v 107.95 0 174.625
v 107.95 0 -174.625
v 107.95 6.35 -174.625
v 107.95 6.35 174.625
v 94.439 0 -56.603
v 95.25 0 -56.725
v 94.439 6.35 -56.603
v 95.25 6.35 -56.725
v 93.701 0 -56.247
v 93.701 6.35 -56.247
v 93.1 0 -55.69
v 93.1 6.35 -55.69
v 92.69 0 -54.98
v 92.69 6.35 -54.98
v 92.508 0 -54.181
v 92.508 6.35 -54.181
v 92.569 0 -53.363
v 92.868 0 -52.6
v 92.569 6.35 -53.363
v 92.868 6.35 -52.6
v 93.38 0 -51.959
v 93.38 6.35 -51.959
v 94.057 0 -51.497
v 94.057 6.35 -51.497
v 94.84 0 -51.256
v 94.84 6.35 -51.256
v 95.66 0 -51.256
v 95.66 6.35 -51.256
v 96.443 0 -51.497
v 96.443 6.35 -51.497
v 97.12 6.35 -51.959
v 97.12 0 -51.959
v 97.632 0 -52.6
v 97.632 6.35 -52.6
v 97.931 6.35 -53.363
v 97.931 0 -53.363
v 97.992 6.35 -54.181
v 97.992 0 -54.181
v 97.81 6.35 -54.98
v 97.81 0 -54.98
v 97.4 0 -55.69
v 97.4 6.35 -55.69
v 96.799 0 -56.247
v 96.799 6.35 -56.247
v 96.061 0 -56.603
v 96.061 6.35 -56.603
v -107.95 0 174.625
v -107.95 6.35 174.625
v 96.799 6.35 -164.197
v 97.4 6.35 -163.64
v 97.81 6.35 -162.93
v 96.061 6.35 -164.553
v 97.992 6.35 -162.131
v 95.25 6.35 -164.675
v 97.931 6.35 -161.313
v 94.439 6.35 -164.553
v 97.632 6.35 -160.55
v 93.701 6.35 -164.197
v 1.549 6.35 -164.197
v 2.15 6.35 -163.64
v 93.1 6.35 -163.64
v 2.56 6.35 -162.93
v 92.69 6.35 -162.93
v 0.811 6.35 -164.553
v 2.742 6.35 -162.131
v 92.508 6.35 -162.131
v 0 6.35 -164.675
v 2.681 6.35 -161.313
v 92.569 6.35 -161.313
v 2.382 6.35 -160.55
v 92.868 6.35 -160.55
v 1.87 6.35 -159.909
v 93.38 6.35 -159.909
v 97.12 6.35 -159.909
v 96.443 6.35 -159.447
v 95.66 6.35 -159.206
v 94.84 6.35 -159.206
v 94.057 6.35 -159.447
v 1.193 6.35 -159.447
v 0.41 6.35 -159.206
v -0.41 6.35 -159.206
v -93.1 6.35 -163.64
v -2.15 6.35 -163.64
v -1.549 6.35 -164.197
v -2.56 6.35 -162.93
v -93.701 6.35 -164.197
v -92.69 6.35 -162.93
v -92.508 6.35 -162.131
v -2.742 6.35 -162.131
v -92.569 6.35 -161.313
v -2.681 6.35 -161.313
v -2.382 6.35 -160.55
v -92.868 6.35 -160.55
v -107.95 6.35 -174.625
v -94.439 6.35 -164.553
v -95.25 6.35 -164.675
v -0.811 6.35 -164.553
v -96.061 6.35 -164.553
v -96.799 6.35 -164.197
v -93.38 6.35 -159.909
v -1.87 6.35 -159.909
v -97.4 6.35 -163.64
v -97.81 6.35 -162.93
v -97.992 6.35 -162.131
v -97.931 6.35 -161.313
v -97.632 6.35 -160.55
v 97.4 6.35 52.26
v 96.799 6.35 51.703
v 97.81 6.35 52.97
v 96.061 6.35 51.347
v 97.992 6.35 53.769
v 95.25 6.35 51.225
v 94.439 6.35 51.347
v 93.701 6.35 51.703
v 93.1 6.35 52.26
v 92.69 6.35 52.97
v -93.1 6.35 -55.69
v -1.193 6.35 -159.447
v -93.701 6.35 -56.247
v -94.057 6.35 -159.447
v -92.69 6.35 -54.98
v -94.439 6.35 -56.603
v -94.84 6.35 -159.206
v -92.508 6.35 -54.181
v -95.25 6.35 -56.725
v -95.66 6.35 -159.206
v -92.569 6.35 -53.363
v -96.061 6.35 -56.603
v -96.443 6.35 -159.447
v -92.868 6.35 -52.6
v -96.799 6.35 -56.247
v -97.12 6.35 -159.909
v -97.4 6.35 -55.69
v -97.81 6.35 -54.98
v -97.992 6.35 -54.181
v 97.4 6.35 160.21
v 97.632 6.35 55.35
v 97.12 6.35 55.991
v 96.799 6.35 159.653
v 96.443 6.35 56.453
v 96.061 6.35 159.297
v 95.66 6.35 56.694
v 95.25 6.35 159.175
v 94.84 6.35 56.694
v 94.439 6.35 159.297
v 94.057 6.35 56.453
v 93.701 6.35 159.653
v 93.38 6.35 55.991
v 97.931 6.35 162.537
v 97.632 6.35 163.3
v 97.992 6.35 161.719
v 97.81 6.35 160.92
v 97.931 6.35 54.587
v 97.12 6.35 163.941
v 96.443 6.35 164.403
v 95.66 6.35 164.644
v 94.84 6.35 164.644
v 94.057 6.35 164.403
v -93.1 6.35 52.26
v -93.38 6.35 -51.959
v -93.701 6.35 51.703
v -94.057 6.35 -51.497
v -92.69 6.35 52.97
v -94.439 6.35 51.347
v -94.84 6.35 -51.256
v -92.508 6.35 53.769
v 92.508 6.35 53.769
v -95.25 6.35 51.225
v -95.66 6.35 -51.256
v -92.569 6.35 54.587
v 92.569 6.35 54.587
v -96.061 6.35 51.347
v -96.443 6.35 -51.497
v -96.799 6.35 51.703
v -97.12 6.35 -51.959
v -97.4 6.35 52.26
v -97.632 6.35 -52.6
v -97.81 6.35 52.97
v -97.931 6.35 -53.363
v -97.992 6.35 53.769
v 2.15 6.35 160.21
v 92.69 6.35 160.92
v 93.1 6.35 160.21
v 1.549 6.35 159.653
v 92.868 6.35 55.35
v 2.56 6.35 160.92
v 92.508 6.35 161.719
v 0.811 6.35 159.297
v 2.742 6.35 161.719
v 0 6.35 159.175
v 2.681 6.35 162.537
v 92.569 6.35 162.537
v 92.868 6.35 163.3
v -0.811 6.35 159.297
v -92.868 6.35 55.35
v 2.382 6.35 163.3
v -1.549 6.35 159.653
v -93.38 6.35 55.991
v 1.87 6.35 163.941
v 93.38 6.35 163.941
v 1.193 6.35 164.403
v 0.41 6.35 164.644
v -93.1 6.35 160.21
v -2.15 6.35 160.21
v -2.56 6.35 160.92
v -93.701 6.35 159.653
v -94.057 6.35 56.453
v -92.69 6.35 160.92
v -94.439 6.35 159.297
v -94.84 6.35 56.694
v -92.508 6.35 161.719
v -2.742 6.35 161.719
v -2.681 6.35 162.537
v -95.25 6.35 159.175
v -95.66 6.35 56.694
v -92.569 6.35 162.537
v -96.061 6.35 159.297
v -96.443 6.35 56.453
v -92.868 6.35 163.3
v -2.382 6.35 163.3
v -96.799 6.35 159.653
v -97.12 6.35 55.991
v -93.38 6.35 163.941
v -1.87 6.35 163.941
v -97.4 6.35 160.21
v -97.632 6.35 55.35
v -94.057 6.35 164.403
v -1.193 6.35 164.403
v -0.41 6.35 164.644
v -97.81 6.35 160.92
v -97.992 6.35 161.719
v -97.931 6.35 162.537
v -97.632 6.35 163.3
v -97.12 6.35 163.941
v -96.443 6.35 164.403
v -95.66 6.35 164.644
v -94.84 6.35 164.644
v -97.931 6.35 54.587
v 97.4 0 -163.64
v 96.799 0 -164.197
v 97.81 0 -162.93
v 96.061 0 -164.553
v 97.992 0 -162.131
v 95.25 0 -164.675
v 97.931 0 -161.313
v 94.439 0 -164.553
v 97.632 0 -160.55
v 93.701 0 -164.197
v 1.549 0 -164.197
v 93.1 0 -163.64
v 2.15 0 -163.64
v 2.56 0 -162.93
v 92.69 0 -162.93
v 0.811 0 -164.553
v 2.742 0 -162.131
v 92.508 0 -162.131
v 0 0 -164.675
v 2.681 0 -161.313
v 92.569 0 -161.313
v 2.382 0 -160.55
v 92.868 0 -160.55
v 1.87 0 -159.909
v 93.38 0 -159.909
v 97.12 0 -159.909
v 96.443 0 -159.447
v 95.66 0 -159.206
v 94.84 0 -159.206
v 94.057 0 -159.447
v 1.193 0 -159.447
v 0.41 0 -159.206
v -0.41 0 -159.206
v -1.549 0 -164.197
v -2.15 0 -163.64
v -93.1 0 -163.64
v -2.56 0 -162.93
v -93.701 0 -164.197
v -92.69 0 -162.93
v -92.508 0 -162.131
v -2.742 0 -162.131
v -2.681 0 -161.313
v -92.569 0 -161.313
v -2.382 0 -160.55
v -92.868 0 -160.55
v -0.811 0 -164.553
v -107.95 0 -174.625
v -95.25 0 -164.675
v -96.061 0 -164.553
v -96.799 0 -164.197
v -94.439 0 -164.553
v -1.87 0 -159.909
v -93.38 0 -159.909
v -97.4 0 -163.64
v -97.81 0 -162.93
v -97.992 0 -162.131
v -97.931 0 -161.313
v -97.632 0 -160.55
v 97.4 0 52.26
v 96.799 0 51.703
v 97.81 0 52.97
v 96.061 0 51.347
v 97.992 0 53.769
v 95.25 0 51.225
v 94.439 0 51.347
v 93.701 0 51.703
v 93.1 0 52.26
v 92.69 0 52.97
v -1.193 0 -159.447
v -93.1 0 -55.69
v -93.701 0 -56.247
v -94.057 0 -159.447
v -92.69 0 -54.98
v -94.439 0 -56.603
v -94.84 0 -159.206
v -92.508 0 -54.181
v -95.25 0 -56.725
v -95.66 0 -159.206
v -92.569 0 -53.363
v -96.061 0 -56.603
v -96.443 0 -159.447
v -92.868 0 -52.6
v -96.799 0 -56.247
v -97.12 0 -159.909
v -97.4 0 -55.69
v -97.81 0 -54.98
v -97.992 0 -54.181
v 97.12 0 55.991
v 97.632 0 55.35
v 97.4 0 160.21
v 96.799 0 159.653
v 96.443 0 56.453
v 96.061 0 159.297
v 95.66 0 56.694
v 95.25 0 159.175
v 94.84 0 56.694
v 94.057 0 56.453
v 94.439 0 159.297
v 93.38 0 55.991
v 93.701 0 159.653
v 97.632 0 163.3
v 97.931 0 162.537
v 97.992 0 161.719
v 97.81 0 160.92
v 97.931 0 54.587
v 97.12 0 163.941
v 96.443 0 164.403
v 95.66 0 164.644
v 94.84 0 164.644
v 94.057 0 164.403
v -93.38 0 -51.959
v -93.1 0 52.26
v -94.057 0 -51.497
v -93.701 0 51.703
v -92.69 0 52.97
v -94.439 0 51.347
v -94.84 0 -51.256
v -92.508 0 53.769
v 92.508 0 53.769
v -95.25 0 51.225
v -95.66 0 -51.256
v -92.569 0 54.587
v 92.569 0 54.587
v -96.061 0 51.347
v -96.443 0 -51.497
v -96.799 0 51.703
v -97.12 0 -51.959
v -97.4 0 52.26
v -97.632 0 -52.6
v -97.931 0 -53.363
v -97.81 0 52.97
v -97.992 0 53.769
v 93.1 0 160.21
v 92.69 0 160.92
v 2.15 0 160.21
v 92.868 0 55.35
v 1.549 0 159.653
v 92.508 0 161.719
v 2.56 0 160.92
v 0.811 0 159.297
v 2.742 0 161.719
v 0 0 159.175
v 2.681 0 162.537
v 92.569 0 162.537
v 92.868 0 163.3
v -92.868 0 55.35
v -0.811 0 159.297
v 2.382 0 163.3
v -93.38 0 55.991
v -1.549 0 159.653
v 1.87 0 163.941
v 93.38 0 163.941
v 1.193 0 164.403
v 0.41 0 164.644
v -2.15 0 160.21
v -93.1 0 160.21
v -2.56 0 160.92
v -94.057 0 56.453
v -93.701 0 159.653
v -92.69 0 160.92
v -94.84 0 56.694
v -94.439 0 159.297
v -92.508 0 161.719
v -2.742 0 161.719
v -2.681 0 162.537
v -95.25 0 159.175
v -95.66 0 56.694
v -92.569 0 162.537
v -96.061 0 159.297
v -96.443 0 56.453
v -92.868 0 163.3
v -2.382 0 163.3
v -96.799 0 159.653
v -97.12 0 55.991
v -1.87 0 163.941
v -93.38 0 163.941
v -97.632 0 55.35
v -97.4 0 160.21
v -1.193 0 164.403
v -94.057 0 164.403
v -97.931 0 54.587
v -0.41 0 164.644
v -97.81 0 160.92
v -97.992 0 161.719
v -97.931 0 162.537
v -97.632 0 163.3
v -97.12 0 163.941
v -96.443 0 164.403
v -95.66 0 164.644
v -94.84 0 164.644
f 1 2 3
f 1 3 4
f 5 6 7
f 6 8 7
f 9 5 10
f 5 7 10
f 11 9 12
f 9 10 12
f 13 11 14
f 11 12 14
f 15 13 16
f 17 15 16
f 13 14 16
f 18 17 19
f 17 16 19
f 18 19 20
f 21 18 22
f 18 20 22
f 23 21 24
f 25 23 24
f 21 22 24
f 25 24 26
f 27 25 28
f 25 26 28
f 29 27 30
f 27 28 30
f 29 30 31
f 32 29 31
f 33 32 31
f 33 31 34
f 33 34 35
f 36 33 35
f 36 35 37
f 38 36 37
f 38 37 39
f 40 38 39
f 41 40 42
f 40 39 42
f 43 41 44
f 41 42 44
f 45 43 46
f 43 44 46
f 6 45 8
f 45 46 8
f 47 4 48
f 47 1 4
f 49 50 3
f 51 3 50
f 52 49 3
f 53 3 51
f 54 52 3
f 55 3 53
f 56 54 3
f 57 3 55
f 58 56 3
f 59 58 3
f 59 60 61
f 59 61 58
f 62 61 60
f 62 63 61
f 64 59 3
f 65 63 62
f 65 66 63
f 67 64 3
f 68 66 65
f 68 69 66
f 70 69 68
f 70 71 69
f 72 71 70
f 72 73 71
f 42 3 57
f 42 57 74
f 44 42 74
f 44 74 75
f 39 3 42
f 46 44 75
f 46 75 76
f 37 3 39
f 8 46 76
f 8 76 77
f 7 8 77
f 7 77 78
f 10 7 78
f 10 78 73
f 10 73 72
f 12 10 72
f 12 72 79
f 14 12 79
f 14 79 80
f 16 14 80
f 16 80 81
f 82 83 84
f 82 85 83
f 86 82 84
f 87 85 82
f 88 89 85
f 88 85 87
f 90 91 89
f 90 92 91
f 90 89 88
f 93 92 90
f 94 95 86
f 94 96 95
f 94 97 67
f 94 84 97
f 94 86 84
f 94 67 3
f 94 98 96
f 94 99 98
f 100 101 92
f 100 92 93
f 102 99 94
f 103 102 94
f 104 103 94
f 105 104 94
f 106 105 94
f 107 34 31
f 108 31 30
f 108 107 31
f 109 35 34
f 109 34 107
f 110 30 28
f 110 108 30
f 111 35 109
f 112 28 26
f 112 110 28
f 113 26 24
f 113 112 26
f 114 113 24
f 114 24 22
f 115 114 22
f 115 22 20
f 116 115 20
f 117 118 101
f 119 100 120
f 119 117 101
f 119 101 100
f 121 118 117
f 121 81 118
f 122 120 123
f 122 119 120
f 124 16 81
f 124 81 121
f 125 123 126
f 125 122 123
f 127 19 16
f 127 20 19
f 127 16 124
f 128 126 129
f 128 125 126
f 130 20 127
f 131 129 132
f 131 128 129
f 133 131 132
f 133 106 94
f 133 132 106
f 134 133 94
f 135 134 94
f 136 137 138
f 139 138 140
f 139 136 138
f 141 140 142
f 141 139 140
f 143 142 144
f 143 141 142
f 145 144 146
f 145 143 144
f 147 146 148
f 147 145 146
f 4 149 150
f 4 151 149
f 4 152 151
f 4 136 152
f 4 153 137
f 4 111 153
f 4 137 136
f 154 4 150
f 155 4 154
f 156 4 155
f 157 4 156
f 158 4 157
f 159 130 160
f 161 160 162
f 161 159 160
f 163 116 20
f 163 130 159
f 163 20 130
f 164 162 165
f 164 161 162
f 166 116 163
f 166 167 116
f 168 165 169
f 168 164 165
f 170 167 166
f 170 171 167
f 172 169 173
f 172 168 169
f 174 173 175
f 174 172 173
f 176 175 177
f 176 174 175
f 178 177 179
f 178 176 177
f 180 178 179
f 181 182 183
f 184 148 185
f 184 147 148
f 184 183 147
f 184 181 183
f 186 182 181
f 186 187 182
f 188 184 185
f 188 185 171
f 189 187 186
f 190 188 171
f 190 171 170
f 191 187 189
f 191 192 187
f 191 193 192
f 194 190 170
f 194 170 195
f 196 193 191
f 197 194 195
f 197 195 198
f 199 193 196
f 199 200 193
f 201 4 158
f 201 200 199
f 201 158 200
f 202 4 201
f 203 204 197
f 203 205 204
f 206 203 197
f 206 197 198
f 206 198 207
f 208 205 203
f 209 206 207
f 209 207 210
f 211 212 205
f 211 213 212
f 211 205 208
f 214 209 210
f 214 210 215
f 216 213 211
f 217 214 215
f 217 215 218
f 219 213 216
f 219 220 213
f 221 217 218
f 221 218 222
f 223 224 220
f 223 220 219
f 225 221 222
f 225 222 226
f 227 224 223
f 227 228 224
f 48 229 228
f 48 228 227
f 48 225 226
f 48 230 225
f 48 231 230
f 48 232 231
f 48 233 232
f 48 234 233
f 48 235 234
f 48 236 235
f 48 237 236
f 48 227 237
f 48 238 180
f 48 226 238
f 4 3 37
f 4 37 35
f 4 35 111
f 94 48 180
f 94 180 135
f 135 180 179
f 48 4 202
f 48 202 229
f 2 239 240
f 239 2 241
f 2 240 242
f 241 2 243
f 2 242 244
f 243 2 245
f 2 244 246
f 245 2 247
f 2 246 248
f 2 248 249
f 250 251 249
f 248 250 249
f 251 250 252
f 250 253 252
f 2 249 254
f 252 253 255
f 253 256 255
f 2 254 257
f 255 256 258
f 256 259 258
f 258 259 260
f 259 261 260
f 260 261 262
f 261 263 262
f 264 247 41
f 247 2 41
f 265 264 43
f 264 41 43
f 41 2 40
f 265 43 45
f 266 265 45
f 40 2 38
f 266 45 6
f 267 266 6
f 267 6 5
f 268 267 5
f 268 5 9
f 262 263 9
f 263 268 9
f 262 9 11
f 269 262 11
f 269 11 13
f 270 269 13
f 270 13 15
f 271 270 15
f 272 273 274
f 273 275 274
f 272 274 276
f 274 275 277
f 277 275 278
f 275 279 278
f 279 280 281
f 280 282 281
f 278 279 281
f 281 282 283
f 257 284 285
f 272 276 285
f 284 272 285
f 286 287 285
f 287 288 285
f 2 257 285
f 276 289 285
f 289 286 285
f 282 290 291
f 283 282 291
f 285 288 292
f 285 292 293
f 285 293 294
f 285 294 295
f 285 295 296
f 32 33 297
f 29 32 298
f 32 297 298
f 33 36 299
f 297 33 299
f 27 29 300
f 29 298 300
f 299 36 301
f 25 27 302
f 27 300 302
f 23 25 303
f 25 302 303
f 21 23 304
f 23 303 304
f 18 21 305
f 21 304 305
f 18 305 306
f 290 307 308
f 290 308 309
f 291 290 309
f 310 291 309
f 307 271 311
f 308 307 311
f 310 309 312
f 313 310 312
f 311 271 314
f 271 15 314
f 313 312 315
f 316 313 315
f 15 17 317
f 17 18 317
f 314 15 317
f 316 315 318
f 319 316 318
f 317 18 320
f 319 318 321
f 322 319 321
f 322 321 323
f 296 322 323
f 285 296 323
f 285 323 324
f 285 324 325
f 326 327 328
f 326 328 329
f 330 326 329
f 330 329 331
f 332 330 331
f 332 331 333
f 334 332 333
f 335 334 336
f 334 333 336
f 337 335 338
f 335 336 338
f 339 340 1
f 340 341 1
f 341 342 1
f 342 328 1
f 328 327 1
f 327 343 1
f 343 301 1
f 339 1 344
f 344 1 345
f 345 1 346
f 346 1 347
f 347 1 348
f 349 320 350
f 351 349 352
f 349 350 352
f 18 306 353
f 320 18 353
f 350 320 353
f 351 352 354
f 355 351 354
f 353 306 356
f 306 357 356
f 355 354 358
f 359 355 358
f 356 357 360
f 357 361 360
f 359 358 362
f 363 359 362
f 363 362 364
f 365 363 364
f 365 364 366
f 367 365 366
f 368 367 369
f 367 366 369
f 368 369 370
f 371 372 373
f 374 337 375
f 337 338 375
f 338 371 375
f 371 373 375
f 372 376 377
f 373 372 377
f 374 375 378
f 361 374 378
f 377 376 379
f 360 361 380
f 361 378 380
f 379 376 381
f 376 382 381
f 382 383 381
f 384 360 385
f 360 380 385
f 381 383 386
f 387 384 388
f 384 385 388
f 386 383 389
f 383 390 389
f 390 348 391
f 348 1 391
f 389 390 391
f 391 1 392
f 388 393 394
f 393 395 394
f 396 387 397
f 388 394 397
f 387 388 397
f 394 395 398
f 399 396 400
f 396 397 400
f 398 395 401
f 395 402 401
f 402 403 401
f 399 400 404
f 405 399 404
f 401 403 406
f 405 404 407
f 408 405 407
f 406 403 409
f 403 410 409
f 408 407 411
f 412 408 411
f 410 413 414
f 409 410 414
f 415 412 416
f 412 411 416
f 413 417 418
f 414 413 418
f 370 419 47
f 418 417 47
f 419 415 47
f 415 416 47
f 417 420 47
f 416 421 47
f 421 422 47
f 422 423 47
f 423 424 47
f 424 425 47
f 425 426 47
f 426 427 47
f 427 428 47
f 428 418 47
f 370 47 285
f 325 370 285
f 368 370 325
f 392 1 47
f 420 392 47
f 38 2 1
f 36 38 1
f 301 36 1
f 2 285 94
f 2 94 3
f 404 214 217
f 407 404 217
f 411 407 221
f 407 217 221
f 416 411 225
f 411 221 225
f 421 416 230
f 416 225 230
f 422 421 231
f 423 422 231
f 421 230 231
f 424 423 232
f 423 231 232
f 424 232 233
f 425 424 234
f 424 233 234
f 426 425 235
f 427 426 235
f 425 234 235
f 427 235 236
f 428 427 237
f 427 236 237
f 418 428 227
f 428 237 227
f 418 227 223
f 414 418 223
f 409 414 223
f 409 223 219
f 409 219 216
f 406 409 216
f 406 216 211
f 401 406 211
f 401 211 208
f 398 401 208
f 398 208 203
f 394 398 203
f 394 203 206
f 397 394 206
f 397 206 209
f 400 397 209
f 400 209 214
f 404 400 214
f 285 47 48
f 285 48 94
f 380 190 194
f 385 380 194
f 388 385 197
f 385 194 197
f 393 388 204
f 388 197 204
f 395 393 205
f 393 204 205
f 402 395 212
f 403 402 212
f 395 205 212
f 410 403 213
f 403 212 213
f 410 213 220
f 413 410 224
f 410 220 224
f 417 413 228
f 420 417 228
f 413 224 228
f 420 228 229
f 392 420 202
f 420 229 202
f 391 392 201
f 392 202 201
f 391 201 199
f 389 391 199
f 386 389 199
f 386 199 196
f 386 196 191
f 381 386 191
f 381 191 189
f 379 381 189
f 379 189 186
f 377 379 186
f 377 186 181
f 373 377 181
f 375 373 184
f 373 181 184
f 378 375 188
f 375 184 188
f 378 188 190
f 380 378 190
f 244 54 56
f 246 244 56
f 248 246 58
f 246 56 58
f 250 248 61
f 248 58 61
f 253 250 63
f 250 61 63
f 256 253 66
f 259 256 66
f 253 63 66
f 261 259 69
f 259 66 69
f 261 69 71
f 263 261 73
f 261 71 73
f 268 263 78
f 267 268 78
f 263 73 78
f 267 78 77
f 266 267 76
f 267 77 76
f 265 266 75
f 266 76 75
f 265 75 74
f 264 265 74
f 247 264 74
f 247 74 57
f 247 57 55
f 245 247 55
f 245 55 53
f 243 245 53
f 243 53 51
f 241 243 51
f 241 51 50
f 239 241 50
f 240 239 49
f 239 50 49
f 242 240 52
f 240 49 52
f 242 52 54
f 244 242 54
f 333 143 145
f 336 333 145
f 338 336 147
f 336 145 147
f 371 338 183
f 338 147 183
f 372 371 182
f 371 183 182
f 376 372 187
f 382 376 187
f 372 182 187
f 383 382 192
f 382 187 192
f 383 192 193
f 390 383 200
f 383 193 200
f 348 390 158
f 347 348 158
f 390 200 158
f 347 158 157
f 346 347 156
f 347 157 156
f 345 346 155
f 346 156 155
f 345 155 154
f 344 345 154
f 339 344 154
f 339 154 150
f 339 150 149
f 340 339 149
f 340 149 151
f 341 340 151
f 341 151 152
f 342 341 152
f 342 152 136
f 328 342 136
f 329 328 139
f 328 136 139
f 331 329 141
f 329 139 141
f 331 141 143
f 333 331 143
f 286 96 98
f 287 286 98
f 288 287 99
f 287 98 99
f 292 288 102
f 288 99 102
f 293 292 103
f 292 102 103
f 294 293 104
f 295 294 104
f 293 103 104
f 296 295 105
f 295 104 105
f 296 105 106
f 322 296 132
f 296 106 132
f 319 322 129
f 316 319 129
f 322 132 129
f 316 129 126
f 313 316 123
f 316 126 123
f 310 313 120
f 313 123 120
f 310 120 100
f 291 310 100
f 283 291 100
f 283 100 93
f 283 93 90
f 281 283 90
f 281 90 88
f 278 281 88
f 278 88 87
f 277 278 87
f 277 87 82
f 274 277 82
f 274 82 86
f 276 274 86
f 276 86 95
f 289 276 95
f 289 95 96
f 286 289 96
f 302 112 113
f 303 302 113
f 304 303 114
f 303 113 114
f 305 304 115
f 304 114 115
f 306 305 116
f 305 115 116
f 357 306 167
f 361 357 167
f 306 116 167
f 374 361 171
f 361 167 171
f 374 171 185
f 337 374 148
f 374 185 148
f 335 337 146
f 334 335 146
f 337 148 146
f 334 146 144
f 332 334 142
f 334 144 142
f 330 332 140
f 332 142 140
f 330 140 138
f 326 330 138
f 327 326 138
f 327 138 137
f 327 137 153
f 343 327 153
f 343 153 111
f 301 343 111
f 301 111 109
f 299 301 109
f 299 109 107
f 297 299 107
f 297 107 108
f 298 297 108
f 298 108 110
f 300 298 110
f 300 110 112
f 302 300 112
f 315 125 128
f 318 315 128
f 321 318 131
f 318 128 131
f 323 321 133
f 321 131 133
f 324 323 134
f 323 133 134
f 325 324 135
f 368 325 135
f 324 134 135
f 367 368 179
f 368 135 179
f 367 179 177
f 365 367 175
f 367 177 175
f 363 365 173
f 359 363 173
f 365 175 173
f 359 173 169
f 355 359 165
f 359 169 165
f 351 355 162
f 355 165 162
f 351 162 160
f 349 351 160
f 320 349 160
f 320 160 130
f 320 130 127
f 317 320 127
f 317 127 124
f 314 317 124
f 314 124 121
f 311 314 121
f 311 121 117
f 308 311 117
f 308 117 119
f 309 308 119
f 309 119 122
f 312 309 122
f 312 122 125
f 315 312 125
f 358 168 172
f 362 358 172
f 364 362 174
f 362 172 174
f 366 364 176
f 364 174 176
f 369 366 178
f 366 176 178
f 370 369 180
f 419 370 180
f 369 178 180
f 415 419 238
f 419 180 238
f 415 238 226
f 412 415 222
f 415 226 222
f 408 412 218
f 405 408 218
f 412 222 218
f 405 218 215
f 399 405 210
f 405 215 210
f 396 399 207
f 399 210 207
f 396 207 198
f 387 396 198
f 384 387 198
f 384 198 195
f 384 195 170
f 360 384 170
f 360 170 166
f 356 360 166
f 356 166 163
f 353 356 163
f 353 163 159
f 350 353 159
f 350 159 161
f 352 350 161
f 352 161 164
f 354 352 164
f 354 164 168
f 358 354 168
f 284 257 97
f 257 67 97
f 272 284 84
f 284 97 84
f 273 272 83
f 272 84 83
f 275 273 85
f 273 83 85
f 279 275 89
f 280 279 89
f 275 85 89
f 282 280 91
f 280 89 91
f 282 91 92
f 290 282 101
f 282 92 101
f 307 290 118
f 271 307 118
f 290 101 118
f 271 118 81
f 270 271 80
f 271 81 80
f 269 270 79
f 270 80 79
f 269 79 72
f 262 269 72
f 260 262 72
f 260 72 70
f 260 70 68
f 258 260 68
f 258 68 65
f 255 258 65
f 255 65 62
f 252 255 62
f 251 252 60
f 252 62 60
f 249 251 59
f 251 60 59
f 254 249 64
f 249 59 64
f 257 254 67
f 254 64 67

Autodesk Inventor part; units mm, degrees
ref_plane "YZ Plane" through (0, 0, 0) normal (1, 0, 0) x (0, 1, 0)
ref_plane "XZ Plane" through (0, 0, 0) normal (0, 1, 0) x (-1, 0, 0)
ref_plane "XY Plane" through (0, 0, 0) normal (0, 0, 1) x (1, 0, 0)
sketch "Sketch1" plane through (0, 0, 0) normal (0, 1, 0) x (-1, 0, 0)
  line L0 (107.95, -174.625) -> (-107.95, -174.625)
  line L1 (-107.95, -174.625) -> (-107.95, 174.625)
  line L2 (-107.95, 174.625) -> (107.95, 174.625)
  line L3 (107.95, 174.625) -> (107.95, -174.625)
  line L4 (107.95, -174.625) -> (-107.95, 174.625) construction
  line L5 (-107.95, -174.625) -> (107.95, 174.625) construction
  point P0 (0, 0)
  dimension "d0" = 215.9
  dimension "d1" = 349.25
extrude "Extrusion1" add sketch "Sketch1" along normal blind 6.35
sketch "Sketch2" plane through (0, 0, 0) normal (0, -1, 0) x (1, 0, 0)
  circle A0 centre (-95.25, 53.975) radius 1.75 projected
  circle A1 centre (0, 161.925) radius 1.75 projected
  circle A2 centre (95.25, 53.975) radius 1.75 projected
  circle A3 centre (95.25, 161.925) radius 1.75 projected
  circle A4 centre (-95.25, 161.925) radius 1.75 projected
  circle A5 centre (-95.25, -161.925) radius 1.75 projected
  circle A6 centre (95.25, -161.925) radius 1.75 projected
  circle A7 centre (95.25, -53.975) radius 1.75 projected
  circle A8 centre (0, -161.925) radius 1.75 projected
  circle A9 centre (-95.25, -53.975) radius 1.75 projected
  circle A10 centre (-65.0875, -144.0656) radius 1.75 projected
  circle A11 centre (65.0875, -144.0656) radius 1.75 projected
  circle A12 centre (49.2125, -144.0656) radius 1.75 projected
  circle A13 centre (-49.2125, -144.0656) radius 1.75 projected
  line L0 (-82.55, -136.525) -> (82.55, -136.525) projected
  line L1 (82.55, -136.525) -> (82.55, 136.525) projected
  line L2 (82.55, 136.525) -> (-82.55, 136.525) projected
  line L3 (-82.55, 136.525) -> (-82.55, -136.525) projected
  line L4 (107.95, -174.625) -> (-107.95, -174.625) projected
  line L5 (-107.95, -174.625) -> (-107.95, 174.625) projected
  line L6 (-107.95, 174.625) -> (107.95, 174.625) projected
  line L7 (107.95, 174.625) -> (107.95, -174.625) projected
  point P0 (0, 0)
hole "Hole1" at (95.25, 0, -161.925) at (0, 0, -161.925) at (-95.25, 0, -161.925) at (-95.25, 0, -53.975) at (-95.25, 0, 53.975) at (-95.25, 0, 161.925) at (0, 0, 161.925) at (95.25, 0, 161.925) at (95.25, 0, 53.975) at (95.25, 0, -53.975) direction (0, 1, 0) diameter 5.5 end through all
sketch "Electronics Area" plane through (0, 6.35, 0) normal (0, 1, 0) x (1, 0, 0)
  line L0 (-88.9, -155.575) -> (88.392, -155.575) projected
  line L1 (-88.9, 174.625) -> (-88.9, -485.775) projected
  line L2 (88.392, 155.575) -> (-88.9, 155.575) projected
  line L3 (88.9, 174.625) -> (88.9, -485.775) projected
  line L4 (88.9, 155.575) -> (-88.9, 155.575)
  line L5 (-88.9, 155.575) -> (-88.9, -155.575)
  line L6 (-88.9, -155.575) -> (88.9, -155.575)
  line L7 (88.9, -155.575) -> (88.9, 155.575)
  line L8 (76.2, 142.875) -> (-76.2, 142.875)
  line L9 (-76.2, 142.875) -> (-76.2, -142.875)
  line L10 (-76.2, -142.875) -> (76.2, -142.875)
  line L11 (76.2, -142.875) -> (76.2, 142.875)
  point P0 (0, 0)
  dimension "d11" = 12.7
properties part number "NASA-20-EBOX-B-01" material "Polycarbonate, Clear"
